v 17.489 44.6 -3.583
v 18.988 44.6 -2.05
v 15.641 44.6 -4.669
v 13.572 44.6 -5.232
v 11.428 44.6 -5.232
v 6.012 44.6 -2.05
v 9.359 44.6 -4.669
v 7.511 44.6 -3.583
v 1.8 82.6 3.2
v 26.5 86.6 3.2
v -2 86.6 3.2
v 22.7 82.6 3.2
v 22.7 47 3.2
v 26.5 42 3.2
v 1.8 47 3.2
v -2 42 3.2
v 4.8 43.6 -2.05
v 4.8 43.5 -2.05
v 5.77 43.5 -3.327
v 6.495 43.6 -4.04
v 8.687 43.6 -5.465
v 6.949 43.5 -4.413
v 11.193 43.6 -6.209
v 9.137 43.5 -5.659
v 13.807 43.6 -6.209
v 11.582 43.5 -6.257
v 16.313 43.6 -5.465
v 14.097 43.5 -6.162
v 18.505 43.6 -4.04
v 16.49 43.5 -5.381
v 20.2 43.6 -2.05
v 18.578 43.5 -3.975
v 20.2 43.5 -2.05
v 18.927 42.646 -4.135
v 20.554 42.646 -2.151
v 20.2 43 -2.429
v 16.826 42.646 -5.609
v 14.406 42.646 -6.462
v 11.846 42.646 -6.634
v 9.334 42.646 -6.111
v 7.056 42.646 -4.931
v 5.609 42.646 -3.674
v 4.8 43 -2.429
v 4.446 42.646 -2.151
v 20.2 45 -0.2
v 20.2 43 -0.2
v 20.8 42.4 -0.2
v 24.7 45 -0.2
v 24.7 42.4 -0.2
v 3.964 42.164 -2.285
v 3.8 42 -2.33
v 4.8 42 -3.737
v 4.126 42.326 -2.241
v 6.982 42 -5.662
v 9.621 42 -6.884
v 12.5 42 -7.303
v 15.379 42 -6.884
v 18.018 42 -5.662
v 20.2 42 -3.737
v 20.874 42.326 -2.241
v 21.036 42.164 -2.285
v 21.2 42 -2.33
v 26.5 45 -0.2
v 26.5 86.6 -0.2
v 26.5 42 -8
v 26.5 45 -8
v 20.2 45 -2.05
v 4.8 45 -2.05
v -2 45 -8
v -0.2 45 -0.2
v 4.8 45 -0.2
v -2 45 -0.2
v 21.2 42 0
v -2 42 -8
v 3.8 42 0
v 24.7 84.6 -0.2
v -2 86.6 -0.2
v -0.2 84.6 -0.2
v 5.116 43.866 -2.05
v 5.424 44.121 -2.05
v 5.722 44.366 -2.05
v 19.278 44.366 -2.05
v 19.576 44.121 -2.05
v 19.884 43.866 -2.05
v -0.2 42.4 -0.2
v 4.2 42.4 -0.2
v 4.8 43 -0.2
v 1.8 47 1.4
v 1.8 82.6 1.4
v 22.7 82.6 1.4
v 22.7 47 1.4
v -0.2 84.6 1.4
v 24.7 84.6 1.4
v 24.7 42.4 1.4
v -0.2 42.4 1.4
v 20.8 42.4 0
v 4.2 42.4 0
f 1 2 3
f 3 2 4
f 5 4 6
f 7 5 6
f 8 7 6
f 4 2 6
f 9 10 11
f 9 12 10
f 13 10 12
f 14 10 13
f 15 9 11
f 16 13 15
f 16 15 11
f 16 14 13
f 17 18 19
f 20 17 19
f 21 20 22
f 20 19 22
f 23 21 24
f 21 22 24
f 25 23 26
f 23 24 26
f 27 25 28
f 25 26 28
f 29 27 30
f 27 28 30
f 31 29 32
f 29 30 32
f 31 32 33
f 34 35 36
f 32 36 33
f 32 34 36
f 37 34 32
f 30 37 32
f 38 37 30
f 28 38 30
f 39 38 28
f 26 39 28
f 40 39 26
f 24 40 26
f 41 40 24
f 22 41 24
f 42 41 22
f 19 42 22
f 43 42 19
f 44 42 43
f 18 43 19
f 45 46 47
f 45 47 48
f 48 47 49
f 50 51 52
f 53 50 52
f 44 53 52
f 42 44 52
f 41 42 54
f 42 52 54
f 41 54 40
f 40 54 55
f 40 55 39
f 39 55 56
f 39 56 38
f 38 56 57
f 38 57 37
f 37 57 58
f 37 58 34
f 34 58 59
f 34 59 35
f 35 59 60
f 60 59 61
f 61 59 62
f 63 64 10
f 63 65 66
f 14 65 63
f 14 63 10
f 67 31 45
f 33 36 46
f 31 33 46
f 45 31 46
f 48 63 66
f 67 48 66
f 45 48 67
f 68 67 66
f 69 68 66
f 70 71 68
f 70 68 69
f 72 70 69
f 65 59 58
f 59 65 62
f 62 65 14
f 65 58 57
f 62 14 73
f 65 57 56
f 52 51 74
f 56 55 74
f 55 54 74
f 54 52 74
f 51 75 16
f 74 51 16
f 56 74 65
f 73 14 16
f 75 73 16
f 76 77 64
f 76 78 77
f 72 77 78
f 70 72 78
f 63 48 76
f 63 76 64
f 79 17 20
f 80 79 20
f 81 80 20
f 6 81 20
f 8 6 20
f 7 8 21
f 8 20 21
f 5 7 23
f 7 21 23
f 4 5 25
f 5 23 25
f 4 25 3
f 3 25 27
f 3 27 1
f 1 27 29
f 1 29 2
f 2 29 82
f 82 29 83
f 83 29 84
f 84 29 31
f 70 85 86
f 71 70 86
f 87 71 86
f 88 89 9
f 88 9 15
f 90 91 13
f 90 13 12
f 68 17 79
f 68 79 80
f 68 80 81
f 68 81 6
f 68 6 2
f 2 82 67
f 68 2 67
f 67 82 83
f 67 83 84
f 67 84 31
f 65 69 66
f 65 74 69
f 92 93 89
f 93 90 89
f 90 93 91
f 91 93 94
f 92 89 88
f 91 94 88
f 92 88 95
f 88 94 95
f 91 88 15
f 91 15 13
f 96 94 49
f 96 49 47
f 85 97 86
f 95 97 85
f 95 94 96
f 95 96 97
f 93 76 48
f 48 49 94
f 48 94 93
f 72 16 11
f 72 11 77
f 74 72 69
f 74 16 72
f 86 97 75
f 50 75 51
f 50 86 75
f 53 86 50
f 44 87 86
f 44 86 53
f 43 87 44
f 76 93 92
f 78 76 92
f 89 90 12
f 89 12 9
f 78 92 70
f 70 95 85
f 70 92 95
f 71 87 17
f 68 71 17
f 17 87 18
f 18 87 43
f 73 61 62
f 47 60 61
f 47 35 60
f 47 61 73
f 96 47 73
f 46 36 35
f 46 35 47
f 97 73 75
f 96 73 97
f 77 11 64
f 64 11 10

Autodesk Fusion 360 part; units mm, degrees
sketch "Sketch1" plane through (0, 0, 0) normal (0, 0, 1) x (1, 0, 0)
  line L0 (0, 0) -> (24.5, 0)
  line L1 (24.5, 0) -> (24.5, 42)
  line L2 (24.5, 42) -> (0, 42)
  line L3 (0, 42) -> (0, 0)
  line L4 (5, 39.4) -> (20, 39.4)
  line L5 (20, 39.4) -> (20, 24.4)
  line L6 (20, 24.4) -> (5, 24.4)
  line L7 (5, 24.4) -> (5, 39.4)
  dimension "d1" = 24.5
  dimension "d2" = 42
  dimension "d3" = 15
  dimension "d4" = 15
  dimension "d5" = 5
  dimension "d6" = 2.6
extrude "Extrude1" add sketch "Sketch1" along normal blind 1.2 contours L0 L1 L2 L3 | L4 L5 L6 L7 makes body 1
extrude "Extrude2" add sketch "Sketch1" against normal blind 1.85 contours L4 L5 L6 L7 bodies 1
sketch "Sketch2" plane through (0, 42, 0) normal (0, 1, 0) x (-1, 0, 0)
  line L0 (-24.5, 0) -> (0, 0)
  line L1 (0, 0) -> (0, 1.2)
  line L2 (0, 1.2) -> (-24.5, 1.2)
  line L3 (-24.5, 1.2) -> (-24.5, 0)
  line L4 (-26.5, 3.2) -> (2, 3.2)
  line L5 (2, 3.2) -> (2, -8)
  line L6 (2, -8) -> (-26.5, -8)
  line L7 (-26.5, -8) -> (-26.5, 3.2)
  line L8 (-20, 0) -> (-5, 0)
  line L9 (-5, 0) -> (-5, -1.85)
  line L10 (-5, -1.85) -> (-20, -1.85)
  line L11 (-20, -1.85) -> (-20, 0)
  line L12 (-20.2, 0.2) -> (-4.8, 0.2)
  line L13 (-4.8, 0.2) -> (-4.8, -2.05)
  line L14 (-4.8, -2.05) -> (-20.2, -2.05)
  line L15 (-20.2, -2.05) -> (-20.2, 0.2)
  line L16 (-24.7, 1.4) -> (0.2, 1.4)
  line L17 (0.2, 1.4) -> (0.2, -0.2)
  line L18 (0.2, -0.2) -> (-24.7, -0.2)
  line L19 (-24.7, -0.2) -> (-24.7, 1.4)
  arc A0 (-20.2, -2.05) -> (-4.8, -2.05) centre (-12.5, 2.7935) ccw
  line L20 (-26.5, 1.4) -> (2, 1.4)
  line L21 (2, 1.4) -> (2, 3.2)
  line L22 (2, 3.2) -> (-26.5, 3.2)
  line L23 (-26.5, 3.2) -> (-26.5, 1.4)
  line L24 (0.2, -0.2) -> (2, -0.2)
  line L25 (2, -0.2) -> (2, 1.4)
  line L26 (2, 1.4) -> (0.2, 1.4)
  line L27 (0.2, 1.4) -> (0.2, -0.2)
  line L28 (-24.7, -0.2) -> (-26.5, -0.2)
  line L29 (-26.5, -0.2) -> (-26.5, 1.4)
  line L30 (-26.5, 1.4) -> (-24.7, 1.4)
  line L31 (-24.7, 1.4) -> (-24.7, -0.2)
  dimension "d11" = 2
  dimension "d12" = 8
  dimension "d13" = 2
  dimension "d14" = 2
  dimension "d15" = 0.2
  dimension "d16" = 0.2
  dimension "d17" = 0.2
  dimension "d18" = 0.2
  dimension "d19" = 0.2
  dimension "d20" = 0.2
  dimension "d21" = 0.2
  dimension "d22" = 0.2
  dimension "d27" = 9.0967
  dimension "d33" = 0.2
extrude "Extrude3" add sketch "Sketch2" along normal blind 3 separate body contours L5 L6 L7 L13 L15 L18 A0 L24 L28 | L14 A0 | L7 L19 L20 L28 L29 L30 L31 | L5 L17 L20 L24 L25 L26 L27 | L4 L5 L7 L16 L20 L21 L22 L23 L26 L30 makes body 2
extrude "Extrude4" add sketch "Sketch2" along normal blind 0.4 contours L0 L8 L12 L13 L15 | L0 L1 L2 L3 L13 L15 L16 L17 L18 L19 L20 L27 L31 | L0 L1 L2 L3 L12 L13 L15 bodies 2
extrude "Extrude5" cut sketch "Sketch2" along normal blind 2.6 contours L14 A0 bodies 2
chamfer "Chamfer1" distance 1 angle 45 1 edges at (12.5, 44.6, -6.3032) on bodies 2
chamfer "Chamfer2" distance 1 angle 45 3 edges at (12.5, 42, -6.3032) (20.2, 42, -1.025) (4.8, 42, -1.025) on bodies 2
chamfer "Chamfer3" distance 0.5 angle 45 1 edges at (12.5, 43, -6.3032) on bodies 2
extrude "Extrude6" add sketch "Sketch2" along normal blind 44.6 contours L7 L19 L20 L28 L29 L30 L31 | L5 L17 L20 L24 L25 L26 L27 | L4 L5 L7 L16 L20 L21 L22 L23 L26 L30 bodies 2
sketch "Sketch3" plane through (0, 0, 1.4) normal (0, 0, -1) x (1, 0, 0)
  line L0 (24.7, -42.4) -> (-0.2, -42.4)
  line L1 (-0.2, -42.4) -> (-0.2, -86.6)
  line L2 (-0.2, -86.6) -> (24.7, -86.6)
  line L3 (24.7, -86.6) -> (24.7, -42.4)
  line L4 (-0.2, -86.6) -> (24.7, -86.6)
  line L5 (24.7, -86.6) -> (24.7, -84.6)
  line L6 (24.7, -84.6) -> (-0.2, -84.6)
  line L7 (-0.2, -84.6) -> (-0.2, -86.6)
  line L8 (1.8, -47) -> (22.7, -47)
  line L9 (22.7, -47) -> (22.7, -82.6)
  line L10 (22.7, -82.6) -> (1.8, -82.6)
  line L11 (1.8, -82.6) -> (1.8, -47)
  line L12 (26.5, -45) -> (-2, -45)
  dimension "d36" = 2
  dimension "d37" = 2
  dimension "d38" = 2
  dimension "d39" = 2
  dimension "d40" = 2
extrude "Extrude7" add sketch "Sketch3" along normal blind 1.6 contours L1 L2 L3 L4 L5 L6 L7 bodies 2
extrude "Extrude8" cut sketch "Sketch3" against normal blind 10 contours L8 L9 L10 L11 bodies 2
hidden bodies 1
equation "d34 = 42 mm + 0.6 mm + 2 mm"
